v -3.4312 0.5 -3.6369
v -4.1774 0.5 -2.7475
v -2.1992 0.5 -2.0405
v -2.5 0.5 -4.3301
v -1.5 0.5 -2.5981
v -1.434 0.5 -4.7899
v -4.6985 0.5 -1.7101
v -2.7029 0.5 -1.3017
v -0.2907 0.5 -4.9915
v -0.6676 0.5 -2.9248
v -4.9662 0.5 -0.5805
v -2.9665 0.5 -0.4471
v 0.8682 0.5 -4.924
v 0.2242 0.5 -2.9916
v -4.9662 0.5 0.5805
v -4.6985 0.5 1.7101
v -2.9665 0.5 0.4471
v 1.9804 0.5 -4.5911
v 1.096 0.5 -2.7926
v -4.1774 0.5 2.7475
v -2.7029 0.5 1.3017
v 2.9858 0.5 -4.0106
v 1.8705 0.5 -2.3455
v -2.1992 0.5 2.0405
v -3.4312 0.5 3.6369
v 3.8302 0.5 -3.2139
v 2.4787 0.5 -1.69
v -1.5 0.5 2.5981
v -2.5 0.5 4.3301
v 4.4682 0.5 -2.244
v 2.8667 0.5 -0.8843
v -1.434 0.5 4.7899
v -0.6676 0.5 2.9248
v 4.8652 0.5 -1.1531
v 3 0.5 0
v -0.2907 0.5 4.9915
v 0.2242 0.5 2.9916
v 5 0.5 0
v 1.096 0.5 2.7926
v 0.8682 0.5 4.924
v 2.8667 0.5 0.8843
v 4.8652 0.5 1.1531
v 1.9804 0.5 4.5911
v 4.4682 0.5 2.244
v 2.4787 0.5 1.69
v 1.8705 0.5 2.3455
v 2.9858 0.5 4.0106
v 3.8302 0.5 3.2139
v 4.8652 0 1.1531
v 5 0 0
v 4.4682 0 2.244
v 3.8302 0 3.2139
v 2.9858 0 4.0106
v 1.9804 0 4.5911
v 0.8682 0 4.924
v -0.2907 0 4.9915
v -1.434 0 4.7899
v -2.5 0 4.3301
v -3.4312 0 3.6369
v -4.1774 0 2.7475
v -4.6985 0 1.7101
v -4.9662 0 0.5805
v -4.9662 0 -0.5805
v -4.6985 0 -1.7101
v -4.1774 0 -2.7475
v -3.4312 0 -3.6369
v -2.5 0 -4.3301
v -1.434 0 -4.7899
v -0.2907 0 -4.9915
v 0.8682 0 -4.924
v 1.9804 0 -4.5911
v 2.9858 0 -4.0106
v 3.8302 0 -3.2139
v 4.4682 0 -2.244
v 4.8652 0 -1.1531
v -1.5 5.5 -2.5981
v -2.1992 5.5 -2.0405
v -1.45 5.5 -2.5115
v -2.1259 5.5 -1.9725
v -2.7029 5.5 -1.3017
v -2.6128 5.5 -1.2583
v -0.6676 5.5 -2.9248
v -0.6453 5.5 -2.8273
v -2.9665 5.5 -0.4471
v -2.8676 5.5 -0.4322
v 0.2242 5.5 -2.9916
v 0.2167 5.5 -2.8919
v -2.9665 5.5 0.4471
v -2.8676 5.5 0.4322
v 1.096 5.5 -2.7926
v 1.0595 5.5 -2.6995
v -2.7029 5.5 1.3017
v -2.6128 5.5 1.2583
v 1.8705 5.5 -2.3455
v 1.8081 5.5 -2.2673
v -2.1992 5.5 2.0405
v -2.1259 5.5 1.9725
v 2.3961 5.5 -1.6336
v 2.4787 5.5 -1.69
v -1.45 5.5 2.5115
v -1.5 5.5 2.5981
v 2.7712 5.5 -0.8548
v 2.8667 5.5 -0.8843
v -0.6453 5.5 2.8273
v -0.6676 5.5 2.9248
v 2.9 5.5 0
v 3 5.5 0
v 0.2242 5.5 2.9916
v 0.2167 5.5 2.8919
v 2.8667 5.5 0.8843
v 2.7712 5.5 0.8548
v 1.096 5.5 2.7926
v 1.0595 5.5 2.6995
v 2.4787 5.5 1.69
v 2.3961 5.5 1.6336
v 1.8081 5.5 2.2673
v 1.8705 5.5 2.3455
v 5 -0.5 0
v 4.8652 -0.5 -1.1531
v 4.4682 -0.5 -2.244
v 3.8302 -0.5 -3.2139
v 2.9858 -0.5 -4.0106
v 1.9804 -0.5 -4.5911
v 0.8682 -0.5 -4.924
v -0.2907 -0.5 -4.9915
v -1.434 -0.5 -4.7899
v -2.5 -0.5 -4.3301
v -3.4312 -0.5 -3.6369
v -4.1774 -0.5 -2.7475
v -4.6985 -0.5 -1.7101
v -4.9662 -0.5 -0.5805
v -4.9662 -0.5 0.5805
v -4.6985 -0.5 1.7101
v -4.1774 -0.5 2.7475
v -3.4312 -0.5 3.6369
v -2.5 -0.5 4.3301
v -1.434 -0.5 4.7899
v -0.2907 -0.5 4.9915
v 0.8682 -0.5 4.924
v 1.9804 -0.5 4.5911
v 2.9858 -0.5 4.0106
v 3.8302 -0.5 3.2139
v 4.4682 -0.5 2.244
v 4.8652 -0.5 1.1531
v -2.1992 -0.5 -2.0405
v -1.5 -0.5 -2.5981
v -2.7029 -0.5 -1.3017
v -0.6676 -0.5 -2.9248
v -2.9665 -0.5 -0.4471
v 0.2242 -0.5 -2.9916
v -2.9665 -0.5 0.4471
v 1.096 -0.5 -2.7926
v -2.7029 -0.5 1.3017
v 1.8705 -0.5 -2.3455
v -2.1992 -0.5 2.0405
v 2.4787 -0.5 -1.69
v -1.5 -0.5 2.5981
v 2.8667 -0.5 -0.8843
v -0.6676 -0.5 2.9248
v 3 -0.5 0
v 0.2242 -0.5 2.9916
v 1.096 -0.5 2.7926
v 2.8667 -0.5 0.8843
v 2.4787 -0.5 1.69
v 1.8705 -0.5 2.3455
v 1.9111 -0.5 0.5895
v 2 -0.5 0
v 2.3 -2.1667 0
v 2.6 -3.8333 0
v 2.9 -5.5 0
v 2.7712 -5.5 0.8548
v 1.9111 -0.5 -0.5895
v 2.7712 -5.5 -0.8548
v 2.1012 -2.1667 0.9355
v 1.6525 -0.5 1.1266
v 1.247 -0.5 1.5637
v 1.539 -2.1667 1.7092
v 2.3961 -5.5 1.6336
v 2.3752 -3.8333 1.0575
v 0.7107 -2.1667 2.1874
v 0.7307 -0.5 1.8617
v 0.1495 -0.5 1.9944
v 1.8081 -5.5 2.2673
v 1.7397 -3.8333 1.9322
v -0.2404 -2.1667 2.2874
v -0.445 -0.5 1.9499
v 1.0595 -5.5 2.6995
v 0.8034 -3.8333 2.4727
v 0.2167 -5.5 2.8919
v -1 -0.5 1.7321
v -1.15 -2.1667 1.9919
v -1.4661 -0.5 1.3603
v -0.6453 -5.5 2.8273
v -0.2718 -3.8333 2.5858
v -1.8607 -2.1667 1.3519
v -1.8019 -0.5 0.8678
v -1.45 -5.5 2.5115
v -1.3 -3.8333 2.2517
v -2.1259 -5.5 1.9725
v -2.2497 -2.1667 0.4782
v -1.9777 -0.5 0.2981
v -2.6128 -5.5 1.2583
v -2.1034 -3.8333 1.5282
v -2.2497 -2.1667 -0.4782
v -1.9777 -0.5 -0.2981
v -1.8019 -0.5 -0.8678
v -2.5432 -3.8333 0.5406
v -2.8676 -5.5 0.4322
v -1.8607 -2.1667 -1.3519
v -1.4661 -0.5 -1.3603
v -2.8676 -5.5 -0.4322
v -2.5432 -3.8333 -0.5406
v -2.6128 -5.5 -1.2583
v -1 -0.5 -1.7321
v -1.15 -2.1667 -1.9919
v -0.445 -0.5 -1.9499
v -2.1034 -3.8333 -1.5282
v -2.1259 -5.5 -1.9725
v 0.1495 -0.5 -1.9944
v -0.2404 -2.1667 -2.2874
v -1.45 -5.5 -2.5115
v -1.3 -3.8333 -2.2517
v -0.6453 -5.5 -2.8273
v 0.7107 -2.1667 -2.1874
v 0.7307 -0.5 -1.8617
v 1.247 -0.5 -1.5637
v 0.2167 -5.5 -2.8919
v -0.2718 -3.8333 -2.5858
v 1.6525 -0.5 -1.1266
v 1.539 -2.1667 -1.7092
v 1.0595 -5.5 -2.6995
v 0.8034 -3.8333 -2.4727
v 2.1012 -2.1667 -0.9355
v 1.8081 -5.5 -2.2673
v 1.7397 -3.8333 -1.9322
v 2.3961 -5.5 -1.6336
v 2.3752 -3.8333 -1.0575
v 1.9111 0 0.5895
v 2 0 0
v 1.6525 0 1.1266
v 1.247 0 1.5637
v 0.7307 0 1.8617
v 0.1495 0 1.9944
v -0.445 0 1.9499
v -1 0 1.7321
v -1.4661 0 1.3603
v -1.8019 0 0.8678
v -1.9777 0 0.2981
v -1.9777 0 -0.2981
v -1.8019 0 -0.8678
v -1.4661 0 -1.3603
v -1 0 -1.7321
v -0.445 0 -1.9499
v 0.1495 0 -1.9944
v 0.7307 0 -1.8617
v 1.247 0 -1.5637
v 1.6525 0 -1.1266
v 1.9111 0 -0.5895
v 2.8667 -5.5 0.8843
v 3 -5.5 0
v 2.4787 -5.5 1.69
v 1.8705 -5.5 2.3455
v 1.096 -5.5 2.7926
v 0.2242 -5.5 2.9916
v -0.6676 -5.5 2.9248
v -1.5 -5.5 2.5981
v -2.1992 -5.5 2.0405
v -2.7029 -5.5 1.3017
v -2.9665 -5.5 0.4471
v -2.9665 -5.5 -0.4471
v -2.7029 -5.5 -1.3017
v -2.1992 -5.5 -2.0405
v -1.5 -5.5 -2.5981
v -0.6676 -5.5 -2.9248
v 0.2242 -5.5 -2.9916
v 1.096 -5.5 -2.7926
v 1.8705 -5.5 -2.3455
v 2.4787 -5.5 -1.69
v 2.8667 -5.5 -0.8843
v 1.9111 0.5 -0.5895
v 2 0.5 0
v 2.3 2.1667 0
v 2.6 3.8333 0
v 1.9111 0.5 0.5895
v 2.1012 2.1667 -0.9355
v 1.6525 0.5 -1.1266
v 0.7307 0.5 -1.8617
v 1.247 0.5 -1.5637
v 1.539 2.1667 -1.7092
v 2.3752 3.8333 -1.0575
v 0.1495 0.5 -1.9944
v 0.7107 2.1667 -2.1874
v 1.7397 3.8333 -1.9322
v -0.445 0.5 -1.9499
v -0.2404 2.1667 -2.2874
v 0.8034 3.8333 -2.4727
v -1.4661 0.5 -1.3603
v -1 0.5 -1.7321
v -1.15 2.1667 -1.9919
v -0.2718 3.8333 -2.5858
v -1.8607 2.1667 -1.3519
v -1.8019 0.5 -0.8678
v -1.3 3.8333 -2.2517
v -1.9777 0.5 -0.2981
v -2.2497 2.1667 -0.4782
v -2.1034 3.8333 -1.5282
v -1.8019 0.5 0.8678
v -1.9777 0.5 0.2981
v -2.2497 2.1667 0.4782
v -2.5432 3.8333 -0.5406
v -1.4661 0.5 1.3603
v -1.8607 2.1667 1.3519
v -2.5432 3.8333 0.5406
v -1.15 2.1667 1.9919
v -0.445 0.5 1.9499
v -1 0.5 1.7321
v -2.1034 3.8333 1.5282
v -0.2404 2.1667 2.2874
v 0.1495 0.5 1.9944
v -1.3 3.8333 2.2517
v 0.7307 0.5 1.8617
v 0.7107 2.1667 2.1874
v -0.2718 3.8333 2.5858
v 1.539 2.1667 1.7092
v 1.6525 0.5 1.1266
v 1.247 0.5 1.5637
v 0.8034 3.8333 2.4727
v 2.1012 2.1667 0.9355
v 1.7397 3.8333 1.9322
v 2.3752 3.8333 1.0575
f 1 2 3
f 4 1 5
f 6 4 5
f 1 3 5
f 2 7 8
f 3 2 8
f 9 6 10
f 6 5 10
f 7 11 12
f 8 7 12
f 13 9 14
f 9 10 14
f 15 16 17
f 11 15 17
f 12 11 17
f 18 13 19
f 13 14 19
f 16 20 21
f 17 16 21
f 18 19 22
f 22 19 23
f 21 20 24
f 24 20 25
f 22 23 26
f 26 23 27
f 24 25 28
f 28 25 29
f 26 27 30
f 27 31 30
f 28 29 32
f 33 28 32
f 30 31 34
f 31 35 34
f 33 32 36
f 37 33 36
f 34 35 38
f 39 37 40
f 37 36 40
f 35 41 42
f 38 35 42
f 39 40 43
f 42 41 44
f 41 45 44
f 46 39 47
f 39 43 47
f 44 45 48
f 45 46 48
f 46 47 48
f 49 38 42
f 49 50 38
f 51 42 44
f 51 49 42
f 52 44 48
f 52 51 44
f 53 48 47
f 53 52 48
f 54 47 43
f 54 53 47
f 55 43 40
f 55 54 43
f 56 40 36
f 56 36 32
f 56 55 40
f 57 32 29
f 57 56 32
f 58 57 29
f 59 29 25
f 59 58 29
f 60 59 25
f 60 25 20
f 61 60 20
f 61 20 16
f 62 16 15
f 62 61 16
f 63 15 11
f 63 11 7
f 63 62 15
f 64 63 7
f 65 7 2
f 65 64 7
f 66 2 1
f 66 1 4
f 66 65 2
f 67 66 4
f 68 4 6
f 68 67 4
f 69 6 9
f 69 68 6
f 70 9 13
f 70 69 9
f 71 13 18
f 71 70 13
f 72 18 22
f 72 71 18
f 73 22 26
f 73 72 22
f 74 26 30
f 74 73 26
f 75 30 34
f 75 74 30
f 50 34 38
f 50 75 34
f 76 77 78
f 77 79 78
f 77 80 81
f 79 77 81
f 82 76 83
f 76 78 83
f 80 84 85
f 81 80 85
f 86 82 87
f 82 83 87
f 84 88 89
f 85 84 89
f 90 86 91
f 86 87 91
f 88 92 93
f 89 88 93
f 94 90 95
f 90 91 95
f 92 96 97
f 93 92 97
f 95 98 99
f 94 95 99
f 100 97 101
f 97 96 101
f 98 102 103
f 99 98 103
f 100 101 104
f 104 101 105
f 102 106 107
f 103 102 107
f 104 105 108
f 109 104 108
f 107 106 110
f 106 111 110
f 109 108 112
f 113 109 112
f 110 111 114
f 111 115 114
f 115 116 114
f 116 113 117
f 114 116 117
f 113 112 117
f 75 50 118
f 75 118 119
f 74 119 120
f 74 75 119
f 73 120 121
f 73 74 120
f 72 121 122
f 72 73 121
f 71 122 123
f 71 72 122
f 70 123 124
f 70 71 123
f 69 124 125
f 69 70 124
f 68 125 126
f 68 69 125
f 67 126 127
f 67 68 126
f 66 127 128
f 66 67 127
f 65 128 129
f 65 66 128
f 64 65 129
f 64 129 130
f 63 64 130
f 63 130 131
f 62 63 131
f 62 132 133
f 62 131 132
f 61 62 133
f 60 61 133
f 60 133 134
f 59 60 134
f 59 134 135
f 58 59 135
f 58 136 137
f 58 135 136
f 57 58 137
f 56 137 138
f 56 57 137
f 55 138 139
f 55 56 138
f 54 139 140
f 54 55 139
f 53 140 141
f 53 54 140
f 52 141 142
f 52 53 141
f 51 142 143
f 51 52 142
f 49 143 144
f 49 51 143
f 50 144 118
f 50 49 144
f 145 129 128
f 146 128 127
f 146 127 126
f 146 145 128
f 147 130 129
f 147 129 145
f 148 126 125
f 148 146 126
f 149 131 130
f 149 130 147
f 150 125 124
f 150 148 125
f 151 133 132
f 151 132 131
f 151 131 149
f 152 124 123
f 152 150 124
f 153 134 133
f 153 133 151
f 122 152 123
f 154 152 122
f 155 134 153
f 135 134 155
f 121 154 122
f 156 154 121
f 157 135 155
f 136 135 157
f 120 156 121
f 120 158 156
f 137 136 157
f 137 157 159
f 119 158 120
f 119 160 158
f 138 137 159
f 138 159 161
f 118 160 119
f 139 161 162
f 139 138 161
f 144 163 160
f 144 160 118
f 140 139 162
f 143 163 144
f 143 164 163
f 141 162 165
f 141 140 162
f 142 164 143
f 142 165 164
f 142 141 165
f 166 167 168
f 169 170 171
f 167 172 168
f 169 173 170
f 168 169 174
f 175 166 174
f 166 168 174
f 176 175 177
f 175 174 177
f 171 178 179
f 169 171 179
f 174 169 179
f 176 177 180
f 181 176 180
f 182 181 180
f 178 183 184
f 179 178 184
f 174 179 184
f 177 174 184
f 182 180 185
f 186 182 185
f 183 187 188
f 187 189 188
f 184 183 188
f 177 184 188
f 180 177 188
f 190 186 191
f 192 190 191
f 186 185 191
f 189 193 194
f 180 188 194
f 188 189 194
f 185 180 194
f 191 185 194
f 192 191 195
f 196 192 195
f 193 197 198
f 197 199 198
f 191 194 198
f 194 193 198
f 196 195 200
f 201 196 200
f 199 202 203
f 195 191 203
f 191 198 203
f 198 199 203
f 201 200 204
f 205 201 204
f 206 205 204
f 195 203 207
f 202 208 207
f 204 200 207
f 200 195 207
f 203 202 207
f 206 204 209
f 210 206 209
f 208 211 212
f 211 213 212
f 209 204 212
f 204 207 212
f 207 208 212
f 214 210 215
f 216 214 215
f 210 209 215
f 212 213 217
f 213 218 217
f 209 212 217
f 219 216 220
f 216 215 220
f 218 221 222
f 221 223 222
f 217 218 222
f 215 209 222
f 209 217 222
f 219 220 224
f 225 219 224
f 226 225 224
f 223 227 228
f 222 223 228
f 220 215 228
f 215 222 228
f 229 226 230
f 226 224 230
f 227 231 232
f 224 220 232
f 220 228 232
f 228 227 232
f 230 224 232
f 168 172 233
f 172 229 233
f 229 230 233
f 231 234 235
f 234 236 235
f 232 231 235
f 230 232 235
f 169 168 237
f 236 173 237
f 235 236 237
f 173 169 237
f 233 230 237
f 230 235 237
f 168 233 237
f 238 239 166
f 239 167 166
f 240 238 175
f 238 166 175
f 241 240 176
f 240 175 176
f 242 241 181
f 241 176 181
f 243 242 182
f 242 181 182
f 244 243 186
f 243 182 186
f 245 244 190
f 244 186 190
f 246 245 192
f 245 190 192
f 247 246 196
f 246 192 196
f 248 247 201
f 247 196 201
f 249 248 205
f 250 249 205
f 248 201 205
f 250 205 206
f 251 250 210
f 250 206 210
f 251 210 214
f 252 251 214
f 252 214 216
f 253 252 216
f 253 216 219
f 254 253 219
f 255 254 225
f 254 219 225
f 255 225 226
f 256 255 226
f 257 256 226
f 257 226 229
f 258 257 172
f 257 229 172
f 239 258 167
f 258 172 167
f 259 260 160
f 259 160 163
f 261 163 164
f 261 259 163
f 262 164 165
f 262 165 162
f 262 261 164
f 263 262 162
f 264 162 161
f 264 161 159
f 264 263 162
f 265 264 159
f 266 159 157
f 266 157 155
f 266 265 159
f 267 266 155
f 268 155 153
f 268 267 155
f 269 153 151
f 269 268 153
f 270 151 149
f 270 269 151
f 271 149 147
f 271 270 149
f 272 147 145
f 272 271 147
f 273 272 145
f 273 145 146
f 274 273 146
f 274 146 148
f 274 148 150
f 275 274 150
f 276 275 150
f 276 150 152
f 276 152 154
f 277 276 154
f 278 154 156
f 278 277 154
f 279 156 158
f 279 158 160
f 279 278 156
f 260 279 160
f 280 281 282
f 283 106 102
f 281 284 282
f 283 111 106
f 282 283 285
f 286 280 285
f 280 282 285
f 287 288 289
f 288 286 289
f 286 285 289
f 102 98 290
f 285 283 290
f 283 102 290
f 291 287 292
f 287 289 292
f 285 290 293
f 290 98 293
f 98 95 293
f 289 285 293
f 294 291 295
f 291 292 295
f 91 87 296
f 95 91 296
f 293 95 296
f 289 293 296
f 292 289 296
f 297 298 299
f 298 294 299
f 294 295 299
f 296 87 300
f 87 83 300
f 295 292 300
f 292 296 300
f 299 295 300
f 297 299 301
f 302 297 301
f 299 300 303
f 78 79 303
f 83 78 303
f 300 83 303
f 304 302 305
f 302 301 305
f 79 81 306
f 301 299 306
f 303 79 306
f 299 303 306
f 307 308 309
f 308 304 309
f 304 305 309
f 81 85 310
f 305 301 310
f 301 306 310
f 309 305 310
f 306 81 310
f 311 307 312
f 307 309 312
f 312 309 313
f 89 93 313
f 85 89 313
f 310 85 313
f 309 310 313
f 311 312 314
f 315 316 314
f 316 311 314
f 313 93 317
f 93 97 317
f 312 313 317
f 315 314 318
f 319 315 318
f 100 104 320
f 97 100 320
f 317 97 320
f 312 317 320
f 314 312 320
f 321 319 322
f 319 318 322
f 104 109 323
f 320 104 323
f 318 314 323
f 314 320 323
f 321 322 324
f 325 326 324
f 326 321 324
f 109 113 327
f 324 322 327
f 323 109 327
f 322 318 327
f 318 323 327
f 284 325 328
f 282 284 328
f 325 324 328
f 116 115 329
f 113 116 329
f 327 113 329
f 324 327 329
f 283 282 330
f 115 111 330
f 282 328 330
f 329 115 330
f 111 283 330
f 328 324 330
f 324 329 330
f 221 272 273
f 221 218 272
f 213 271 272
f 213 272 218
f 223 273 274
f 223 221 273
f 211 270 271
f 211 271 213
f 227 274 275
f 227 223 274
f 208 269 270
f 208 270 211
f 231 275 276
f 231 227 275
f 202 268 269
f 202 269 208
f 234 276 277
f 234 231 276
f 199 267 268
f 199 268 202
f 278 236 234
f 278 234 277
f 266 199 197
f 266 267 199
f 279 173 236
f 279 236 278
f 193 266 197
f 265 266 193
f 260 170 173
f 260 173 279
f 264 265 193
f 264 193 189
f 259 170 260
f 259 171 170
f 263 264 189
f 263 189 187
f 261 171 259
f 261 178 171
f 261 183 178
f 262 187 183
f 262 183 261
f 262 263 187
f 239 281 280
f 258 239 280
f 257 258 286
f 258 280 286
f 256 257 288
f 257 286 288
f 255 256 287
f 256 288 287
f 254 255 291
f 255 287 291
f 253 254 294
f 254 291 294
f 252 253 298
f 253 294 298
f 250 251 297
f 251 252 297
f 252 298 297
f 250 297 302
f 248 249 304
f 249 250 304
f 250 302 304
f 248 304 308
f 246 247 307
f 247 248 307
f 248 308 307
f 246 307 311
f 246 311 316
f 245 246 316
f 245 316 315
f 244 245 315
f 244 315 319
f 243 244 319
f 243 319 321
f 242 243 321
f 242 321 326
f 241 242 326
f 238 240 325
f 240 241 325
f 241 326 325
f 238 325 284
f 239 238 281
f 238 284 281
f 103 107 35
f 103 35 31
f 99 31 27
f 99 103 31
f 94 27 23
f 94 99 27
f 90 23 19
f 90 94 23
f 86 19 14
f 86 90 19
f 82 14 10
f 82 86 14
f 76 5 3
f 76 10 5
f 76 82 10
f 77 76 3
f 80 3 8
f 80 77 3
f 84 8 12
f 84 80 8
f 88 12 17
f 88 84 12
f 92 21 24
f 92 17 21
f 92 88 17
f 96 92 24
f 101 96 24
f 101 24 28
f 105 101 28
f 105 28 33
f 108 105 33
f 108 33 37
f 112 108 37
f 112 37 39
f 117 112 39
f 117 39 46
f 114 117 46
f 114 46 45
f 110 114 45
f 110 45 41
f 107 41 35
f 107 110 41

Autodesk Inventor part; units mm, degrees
ref_plane "YZ Plane" through (0, 0, 0) normal (1, 0, 0) x (0, 1, 0)
ref_plane "XZ Plane" through (0, 0, 0) normal (0, 1, 0) x (-1, 0, 0)
ref_plane "XY Plane" through (0, 0, 0) normal (0, 0, 1) x (1, 0, 0)
sketch "Sketch1" plane through (0, 0, 0) normal (0, 0, 1) x (1, 0, 0)
  line L0 (0, 7.4625) -> (0, -7.4625)
  line L1 (-17.6657, 0) -> (17.6657, 0) construction
  line L2 (2, 0.5) -> (5, 0.5)
  line L3 (5, 0.5) -> (5, 0)
  line L4 (5, 0) -> (2, 0)
  line L5 (2, 0) -> (2, 0.5)
  line L6 (3, 0.5) -> (3, 5.5)
  line L7 (3, 5.5) -> (2.9, 5.5)
  line L8 (2.9, 5.5) -> (2, 0.5)
  line L9 (2, -0.5) -> (5, -0.5)
  line L10 (5, -0.5) -> (5, 0)
  line L11 (2, 0) -> (2, -0.5)
  line L12 (3, -0.5) -> (3, -5.5)
  line L13 (3, -5.5) -> (2.9, -5.5)
  line L14 (2.9, -5.5) -> (2, -0.5)
  point P0 (0, 0)
  point P1 (0, 0)
  dimension "d5" = 5
  dimension "d6" = 0.5
  dimension "d7" = 0.1
  dimension "d8" = 6
  dimension "d9" = 1
  dimension "d10" = 10
revolve "Revolution1" add sketch "Sketch1" angle 360 about axis through (0, 7.4625, 0) along (0, -1, 0)
equation "\"d5\" = cn_h"
equation "\"d6\" = 0.5 * w_th"
equation "\"d7\" = tol"
equation "\"d8\" = t_D"
equation "\"d9\" = w_th"
equation "\"d10\" = top_D"
equation "\"tol\" = 0.1"
equation "\"w_th\" = 1"
equation "\"t_D\" = 6"
equation "\"top_D\" = 10"
equation "\"cn_h\" = 5"
equation "\"fillet_D\" = 2"
equation "\"w_l\" = 6"
equation "\"t_D_f\" = t_D + w_th"
equation "\"top_th\" = t_D + w_th"
equation "\"top_th_f\" = t_D_f + cn_h"
equation "\"lv_OD\" = 26"
equation "\"lv_th\" = 1.6"
equation "\"sv_OD\" = 13"
equation "\"sv_th\" = 1.5"
equation "\"b_OD\" = 44"
equation "\"b_th\" = 1.5"
equation "\"b_ID\" = 36.5"
equation "\"b_rim_h\" = 5"
equation "\"h_D\" = 0.9"
equation "\"h_s\" = 2.25"
equation "\"v_h_D\" = 7.5"
equation "\"v_h_off\" = 0.5 * cn_D + 0.5 * v_h_D"
equation "\"cn_D\" = 13.2"
properties part number "adapter"
